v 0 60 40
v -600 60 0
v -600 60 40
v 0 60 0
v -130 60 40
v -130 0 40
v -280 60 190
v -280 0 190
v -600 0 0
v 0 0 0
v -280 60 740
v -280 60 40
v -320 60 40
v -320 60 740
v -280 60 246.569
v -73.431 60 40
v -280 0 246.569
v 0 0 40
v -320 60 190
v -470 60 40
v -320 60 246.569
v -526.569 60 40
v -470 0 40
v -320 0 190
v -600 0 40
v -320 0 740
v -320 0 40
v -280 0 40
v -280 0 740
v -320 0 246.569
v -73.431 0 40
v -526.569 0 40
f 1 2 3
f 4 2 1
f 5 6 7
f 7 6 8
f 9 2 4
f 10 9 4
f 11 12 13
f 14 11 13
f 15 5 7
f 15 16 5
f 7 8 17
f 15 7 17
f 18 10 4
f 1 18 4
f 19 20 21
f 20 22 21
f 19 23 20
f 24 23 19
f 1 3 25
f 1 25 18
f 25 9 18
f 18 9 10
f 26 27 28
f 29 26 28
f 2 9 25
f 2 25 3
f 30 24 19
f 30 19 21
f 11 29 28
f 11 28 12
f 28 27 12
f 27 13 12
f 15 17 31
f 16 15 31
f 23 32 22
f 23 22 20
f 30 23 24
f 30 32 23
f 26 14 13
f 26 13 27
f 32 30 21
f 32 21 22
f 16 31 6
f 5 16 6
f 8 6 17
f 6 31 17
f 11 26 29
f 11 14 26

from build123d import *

# Parameters (mm, degrees)
F0_W     = 600
F0_H     = 60
F1_DEPTH = 40
F3_DEPTH = 700
F5_DEPTH = 60


with BuildPart() as f1:
    # F0 (on Top) → F1 (new body)
    with BuildSketch(Plane.XY):
        with Locations((-300, 30)):
            Rectangle(F0_W, F0_H)
    extrude(amount=F1_DEPTH)


with BuildPart() as f3:
    # F2 (on face) → F3 (new body)
    with BuildSketch(Plane.XY.offset(40)):
        Polygon((-320, 0), (-300, 0), (-280, 0), (-280, 60), (-300, 60), (-320, 60), align=None)
    extrude(amount=F3_DEPTH)


with BuildPart() as f5:
    # F4 (on face) → F5 (new body)
    with BuildSketch(Plane.XZ):
        Polygon((-470, 40), (-320, 190), (-320, 246.568542), (-526.568542, 40), align=None)
    extrude(amount=-F5_DEPTH)


with BuildPart() as f7_1:
    # F7: instance of F5
    add(f5.part.mirror(Plane(origin=(-300, 30, 390), x_dir=(0, -1, 0), z_dir=(-1, 0, 0))))


solid = Compound([f1.part, f3.part, f5.part, f7_1.part])
